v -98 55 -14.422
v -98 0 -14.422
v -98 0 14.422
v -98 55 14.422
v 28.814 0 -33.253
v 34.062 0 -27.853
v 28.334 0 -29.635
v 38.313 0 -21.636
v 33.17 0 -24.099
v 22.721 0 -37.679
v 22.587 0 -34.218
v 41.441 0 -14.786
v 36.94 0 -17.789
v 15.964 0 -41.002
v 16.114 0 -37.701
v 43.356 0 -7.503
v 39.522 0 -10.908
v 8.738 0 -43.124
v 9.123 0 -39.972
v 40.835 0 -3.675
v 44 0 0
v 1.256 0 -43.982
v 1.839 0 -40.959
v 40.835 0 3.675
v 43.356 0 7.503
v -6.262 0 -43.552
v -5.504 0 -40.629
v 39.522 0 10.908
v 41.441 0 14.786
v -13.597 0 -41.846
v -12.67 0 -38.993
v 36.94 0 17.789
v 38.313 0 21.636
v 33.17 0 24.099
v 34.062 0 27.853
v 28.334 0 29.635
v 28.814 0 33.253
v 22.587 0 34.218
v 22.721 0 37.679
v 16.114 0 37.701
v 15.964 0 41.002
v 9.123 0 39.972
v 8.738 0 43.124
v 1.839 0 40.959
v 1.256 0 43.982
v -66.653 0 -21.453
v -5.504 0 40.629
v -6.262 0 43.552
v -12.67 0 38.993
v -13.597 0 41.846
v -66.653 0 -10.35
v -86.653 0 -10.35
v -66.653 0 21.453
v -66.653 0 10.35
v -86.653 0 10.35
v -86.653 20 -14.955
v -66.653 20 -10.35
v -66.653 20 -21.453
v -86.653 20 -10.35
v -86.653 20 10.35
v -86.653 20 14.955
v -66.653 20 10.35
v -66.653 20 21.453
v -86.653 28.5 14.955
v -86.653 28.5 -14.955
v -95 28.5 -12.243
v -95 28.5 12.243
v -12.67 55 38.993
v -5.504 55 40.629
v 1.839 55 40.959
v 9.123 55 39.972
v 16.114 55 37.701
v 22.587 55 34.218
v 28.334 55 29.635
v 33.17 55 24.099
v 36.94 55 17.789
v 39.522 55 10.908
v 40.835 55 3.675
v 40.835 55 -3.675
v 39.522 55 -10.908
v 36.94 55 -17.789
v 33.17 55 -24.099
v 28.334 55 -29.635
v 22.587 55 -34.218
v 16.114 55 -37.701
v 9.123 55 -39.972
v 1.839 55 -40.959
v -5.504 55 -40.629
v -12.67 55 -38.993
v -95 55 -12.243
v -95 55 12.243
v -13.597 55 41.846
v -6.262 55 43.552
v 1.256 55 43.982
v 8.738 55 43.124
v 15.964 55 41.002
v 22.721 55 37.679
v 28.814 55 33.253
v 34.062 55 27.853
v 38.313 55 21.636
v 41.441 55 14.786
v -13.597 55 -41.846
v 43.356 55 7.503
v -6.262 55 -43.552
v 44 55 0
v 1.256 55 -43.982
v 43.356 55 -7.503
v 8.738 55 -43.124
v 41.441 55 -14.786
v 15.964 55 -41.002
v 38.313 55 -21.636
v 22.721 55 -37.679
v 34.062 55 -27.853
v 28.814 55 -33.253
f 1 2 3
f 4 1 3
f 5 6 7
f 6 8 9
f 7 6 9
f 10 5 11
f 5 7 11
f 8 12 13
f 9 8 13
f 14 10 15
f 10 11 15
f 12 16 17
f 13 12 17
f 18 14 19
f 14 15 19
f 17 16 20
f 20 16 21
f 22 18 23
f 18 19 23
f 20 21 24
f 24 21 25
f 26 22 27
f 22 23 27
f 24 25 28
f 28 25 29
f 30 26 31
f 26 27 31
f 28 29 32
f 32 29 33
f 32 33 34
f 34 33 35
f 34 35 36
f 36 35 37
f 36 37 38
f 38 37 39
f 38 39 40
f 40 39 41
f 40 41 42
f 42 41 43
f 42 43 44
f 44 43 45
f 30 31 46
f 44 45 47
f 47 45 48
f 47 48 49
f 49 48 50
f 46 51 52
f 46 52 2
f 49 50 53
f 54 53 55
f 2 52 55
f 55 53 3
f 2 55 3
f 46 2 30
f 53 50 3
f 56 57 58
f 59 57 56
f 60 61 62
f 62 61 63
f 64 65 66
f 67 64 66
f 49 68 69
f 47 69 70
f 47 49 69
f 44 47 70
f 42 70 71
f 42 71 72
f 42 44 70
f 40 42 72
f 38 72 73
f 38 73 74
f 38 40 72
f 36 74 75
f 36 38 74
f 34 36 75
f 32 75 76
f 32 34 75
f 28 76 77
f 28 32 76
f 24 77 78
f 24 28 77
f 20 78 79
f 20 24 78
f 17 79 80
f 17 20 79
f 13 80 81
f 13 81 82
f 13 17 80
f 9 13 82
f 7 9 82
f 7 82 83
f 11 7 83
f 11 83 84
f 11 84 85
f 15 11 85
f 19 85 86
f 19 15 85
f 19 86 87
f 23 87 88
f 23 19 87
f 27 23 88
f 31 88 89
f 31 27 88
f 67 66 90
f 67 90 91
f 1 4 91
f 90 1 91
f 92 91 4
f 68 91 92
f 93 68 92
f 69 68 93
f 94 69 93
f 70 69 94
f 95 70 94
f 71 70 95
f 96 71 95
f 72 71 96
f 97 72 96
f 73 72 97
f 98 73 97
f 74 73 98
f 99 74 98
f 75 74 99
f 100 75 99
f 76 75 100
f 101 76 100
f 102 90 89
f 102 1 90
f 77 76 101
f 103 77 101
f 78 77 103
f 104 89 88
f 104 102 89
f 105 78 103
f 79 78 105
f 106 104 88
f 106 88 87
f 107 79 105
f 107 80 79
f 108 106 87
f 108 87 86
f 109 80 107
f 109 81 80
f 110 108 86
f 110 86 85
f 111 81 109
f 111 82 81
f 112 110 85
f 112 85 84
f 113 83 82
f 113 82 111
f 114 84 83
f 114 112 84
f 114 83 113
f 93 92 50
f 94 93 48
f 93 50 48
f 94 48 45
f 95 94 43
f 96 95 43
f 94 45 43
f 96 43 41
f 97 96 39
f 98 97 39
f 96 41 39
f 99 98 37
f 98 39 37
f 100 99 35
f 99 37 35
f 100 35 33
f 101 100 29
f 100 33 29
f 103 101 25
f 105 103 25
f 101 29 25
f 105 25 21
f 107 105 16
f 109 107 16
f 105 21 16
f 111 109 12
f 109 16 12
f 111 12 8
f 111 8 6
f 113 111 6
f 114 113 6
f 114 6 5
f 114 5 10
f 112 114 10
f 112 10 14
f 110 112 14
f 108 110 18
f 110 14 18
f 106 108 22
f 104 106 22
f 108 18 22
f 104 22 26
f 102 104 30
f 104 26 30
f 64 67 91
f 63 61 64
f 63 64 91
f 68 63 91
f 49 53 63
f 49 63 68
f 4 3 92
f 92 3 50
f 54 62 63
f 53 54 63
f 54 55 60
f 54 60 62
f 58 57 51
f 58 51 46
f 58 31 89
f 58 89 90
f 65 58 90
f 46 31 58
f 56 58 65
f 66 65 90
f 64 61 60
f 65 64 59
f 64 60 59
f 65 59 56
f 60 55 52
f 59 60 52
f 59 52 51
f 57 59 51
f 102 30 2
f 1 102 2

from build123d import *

# Parameters (mm, degrees)
BOSS_EXTRUDE1_DEPTH = 55
BOSS_EXTRUDE2_DEPTH = 28.5
BOSS_EXTRUDE3_DEPTH = 20


with BuildPart() as part:
    # Sketch1 → Boss-Extrude1 (new body)
    with BuildSketch(Plane(origin=(0, 0, 0), x_dir=(1, 0, 0), z_dir=(0, 1, 0))):
        with BuildLine():
            Line((-97.999995759, -14.422208071), (-13.596749299, -41.846487728))
            ThreePointArc((-13.596749299, -41.846487728), (44.00000144, 0), (-13.596749299, 41.846487728))
            Line((-13.596749299, 41.846487728), (-97.999995759, 14.422208071))
            Line((-97.999995759, 14.422208071), (-97.999995759, -14.422208071))
        make_face()
        with BuildLine():
            Line((-94.999995759, -12.242580547), (-12.669698241, -38.993318204))
            ThreePointArc((-12.669698241, -38.993318204), (41.00000144, 0), (-12.669698241, 38.993318204))
            Line((-12.669698241, 38.993318204), (-94.999995759, 12.242580547))
            Line((-94.999995759, 12.242580547), (-94.999995759, -12.242580547))
        make_face(mode=Mode.SUBTRACT)
    extrude(amount=BOSS_EXTRUDE1_DEPTH)

    # Sketch2 → Boss-Extrude2 (add)
    with BuildSketch(Plane.XZ):
        Polygon((-86.653035759, 14.954672498), (-86.653035759, -14.954672498), (-94.999995759, -12.242580547), (-94.999995759, 12.242580547), align=None)
    extrude(amount=-BOSS_EXTRUDE2_DEPTH)

    # Sketch3 → Boss-Extrude3 (add)
    with BuildSketch(Plane.XZ):
        Polygon((-86.653035759, -10.35), (-66.653035759, -10.35), (-66.653035759, -21.453067005), (-86.653035759, -14.954672498), align=None)
        Polygon((-66.653035759, 21.453067005), (-86.653035759, 14.954672498), (-86.653035759, 10.35), (-66.653035759, 10.35), align=None)
    extrude(amount=-BOSS_EXTRUDE3_DEPTH)


solid = part.part
